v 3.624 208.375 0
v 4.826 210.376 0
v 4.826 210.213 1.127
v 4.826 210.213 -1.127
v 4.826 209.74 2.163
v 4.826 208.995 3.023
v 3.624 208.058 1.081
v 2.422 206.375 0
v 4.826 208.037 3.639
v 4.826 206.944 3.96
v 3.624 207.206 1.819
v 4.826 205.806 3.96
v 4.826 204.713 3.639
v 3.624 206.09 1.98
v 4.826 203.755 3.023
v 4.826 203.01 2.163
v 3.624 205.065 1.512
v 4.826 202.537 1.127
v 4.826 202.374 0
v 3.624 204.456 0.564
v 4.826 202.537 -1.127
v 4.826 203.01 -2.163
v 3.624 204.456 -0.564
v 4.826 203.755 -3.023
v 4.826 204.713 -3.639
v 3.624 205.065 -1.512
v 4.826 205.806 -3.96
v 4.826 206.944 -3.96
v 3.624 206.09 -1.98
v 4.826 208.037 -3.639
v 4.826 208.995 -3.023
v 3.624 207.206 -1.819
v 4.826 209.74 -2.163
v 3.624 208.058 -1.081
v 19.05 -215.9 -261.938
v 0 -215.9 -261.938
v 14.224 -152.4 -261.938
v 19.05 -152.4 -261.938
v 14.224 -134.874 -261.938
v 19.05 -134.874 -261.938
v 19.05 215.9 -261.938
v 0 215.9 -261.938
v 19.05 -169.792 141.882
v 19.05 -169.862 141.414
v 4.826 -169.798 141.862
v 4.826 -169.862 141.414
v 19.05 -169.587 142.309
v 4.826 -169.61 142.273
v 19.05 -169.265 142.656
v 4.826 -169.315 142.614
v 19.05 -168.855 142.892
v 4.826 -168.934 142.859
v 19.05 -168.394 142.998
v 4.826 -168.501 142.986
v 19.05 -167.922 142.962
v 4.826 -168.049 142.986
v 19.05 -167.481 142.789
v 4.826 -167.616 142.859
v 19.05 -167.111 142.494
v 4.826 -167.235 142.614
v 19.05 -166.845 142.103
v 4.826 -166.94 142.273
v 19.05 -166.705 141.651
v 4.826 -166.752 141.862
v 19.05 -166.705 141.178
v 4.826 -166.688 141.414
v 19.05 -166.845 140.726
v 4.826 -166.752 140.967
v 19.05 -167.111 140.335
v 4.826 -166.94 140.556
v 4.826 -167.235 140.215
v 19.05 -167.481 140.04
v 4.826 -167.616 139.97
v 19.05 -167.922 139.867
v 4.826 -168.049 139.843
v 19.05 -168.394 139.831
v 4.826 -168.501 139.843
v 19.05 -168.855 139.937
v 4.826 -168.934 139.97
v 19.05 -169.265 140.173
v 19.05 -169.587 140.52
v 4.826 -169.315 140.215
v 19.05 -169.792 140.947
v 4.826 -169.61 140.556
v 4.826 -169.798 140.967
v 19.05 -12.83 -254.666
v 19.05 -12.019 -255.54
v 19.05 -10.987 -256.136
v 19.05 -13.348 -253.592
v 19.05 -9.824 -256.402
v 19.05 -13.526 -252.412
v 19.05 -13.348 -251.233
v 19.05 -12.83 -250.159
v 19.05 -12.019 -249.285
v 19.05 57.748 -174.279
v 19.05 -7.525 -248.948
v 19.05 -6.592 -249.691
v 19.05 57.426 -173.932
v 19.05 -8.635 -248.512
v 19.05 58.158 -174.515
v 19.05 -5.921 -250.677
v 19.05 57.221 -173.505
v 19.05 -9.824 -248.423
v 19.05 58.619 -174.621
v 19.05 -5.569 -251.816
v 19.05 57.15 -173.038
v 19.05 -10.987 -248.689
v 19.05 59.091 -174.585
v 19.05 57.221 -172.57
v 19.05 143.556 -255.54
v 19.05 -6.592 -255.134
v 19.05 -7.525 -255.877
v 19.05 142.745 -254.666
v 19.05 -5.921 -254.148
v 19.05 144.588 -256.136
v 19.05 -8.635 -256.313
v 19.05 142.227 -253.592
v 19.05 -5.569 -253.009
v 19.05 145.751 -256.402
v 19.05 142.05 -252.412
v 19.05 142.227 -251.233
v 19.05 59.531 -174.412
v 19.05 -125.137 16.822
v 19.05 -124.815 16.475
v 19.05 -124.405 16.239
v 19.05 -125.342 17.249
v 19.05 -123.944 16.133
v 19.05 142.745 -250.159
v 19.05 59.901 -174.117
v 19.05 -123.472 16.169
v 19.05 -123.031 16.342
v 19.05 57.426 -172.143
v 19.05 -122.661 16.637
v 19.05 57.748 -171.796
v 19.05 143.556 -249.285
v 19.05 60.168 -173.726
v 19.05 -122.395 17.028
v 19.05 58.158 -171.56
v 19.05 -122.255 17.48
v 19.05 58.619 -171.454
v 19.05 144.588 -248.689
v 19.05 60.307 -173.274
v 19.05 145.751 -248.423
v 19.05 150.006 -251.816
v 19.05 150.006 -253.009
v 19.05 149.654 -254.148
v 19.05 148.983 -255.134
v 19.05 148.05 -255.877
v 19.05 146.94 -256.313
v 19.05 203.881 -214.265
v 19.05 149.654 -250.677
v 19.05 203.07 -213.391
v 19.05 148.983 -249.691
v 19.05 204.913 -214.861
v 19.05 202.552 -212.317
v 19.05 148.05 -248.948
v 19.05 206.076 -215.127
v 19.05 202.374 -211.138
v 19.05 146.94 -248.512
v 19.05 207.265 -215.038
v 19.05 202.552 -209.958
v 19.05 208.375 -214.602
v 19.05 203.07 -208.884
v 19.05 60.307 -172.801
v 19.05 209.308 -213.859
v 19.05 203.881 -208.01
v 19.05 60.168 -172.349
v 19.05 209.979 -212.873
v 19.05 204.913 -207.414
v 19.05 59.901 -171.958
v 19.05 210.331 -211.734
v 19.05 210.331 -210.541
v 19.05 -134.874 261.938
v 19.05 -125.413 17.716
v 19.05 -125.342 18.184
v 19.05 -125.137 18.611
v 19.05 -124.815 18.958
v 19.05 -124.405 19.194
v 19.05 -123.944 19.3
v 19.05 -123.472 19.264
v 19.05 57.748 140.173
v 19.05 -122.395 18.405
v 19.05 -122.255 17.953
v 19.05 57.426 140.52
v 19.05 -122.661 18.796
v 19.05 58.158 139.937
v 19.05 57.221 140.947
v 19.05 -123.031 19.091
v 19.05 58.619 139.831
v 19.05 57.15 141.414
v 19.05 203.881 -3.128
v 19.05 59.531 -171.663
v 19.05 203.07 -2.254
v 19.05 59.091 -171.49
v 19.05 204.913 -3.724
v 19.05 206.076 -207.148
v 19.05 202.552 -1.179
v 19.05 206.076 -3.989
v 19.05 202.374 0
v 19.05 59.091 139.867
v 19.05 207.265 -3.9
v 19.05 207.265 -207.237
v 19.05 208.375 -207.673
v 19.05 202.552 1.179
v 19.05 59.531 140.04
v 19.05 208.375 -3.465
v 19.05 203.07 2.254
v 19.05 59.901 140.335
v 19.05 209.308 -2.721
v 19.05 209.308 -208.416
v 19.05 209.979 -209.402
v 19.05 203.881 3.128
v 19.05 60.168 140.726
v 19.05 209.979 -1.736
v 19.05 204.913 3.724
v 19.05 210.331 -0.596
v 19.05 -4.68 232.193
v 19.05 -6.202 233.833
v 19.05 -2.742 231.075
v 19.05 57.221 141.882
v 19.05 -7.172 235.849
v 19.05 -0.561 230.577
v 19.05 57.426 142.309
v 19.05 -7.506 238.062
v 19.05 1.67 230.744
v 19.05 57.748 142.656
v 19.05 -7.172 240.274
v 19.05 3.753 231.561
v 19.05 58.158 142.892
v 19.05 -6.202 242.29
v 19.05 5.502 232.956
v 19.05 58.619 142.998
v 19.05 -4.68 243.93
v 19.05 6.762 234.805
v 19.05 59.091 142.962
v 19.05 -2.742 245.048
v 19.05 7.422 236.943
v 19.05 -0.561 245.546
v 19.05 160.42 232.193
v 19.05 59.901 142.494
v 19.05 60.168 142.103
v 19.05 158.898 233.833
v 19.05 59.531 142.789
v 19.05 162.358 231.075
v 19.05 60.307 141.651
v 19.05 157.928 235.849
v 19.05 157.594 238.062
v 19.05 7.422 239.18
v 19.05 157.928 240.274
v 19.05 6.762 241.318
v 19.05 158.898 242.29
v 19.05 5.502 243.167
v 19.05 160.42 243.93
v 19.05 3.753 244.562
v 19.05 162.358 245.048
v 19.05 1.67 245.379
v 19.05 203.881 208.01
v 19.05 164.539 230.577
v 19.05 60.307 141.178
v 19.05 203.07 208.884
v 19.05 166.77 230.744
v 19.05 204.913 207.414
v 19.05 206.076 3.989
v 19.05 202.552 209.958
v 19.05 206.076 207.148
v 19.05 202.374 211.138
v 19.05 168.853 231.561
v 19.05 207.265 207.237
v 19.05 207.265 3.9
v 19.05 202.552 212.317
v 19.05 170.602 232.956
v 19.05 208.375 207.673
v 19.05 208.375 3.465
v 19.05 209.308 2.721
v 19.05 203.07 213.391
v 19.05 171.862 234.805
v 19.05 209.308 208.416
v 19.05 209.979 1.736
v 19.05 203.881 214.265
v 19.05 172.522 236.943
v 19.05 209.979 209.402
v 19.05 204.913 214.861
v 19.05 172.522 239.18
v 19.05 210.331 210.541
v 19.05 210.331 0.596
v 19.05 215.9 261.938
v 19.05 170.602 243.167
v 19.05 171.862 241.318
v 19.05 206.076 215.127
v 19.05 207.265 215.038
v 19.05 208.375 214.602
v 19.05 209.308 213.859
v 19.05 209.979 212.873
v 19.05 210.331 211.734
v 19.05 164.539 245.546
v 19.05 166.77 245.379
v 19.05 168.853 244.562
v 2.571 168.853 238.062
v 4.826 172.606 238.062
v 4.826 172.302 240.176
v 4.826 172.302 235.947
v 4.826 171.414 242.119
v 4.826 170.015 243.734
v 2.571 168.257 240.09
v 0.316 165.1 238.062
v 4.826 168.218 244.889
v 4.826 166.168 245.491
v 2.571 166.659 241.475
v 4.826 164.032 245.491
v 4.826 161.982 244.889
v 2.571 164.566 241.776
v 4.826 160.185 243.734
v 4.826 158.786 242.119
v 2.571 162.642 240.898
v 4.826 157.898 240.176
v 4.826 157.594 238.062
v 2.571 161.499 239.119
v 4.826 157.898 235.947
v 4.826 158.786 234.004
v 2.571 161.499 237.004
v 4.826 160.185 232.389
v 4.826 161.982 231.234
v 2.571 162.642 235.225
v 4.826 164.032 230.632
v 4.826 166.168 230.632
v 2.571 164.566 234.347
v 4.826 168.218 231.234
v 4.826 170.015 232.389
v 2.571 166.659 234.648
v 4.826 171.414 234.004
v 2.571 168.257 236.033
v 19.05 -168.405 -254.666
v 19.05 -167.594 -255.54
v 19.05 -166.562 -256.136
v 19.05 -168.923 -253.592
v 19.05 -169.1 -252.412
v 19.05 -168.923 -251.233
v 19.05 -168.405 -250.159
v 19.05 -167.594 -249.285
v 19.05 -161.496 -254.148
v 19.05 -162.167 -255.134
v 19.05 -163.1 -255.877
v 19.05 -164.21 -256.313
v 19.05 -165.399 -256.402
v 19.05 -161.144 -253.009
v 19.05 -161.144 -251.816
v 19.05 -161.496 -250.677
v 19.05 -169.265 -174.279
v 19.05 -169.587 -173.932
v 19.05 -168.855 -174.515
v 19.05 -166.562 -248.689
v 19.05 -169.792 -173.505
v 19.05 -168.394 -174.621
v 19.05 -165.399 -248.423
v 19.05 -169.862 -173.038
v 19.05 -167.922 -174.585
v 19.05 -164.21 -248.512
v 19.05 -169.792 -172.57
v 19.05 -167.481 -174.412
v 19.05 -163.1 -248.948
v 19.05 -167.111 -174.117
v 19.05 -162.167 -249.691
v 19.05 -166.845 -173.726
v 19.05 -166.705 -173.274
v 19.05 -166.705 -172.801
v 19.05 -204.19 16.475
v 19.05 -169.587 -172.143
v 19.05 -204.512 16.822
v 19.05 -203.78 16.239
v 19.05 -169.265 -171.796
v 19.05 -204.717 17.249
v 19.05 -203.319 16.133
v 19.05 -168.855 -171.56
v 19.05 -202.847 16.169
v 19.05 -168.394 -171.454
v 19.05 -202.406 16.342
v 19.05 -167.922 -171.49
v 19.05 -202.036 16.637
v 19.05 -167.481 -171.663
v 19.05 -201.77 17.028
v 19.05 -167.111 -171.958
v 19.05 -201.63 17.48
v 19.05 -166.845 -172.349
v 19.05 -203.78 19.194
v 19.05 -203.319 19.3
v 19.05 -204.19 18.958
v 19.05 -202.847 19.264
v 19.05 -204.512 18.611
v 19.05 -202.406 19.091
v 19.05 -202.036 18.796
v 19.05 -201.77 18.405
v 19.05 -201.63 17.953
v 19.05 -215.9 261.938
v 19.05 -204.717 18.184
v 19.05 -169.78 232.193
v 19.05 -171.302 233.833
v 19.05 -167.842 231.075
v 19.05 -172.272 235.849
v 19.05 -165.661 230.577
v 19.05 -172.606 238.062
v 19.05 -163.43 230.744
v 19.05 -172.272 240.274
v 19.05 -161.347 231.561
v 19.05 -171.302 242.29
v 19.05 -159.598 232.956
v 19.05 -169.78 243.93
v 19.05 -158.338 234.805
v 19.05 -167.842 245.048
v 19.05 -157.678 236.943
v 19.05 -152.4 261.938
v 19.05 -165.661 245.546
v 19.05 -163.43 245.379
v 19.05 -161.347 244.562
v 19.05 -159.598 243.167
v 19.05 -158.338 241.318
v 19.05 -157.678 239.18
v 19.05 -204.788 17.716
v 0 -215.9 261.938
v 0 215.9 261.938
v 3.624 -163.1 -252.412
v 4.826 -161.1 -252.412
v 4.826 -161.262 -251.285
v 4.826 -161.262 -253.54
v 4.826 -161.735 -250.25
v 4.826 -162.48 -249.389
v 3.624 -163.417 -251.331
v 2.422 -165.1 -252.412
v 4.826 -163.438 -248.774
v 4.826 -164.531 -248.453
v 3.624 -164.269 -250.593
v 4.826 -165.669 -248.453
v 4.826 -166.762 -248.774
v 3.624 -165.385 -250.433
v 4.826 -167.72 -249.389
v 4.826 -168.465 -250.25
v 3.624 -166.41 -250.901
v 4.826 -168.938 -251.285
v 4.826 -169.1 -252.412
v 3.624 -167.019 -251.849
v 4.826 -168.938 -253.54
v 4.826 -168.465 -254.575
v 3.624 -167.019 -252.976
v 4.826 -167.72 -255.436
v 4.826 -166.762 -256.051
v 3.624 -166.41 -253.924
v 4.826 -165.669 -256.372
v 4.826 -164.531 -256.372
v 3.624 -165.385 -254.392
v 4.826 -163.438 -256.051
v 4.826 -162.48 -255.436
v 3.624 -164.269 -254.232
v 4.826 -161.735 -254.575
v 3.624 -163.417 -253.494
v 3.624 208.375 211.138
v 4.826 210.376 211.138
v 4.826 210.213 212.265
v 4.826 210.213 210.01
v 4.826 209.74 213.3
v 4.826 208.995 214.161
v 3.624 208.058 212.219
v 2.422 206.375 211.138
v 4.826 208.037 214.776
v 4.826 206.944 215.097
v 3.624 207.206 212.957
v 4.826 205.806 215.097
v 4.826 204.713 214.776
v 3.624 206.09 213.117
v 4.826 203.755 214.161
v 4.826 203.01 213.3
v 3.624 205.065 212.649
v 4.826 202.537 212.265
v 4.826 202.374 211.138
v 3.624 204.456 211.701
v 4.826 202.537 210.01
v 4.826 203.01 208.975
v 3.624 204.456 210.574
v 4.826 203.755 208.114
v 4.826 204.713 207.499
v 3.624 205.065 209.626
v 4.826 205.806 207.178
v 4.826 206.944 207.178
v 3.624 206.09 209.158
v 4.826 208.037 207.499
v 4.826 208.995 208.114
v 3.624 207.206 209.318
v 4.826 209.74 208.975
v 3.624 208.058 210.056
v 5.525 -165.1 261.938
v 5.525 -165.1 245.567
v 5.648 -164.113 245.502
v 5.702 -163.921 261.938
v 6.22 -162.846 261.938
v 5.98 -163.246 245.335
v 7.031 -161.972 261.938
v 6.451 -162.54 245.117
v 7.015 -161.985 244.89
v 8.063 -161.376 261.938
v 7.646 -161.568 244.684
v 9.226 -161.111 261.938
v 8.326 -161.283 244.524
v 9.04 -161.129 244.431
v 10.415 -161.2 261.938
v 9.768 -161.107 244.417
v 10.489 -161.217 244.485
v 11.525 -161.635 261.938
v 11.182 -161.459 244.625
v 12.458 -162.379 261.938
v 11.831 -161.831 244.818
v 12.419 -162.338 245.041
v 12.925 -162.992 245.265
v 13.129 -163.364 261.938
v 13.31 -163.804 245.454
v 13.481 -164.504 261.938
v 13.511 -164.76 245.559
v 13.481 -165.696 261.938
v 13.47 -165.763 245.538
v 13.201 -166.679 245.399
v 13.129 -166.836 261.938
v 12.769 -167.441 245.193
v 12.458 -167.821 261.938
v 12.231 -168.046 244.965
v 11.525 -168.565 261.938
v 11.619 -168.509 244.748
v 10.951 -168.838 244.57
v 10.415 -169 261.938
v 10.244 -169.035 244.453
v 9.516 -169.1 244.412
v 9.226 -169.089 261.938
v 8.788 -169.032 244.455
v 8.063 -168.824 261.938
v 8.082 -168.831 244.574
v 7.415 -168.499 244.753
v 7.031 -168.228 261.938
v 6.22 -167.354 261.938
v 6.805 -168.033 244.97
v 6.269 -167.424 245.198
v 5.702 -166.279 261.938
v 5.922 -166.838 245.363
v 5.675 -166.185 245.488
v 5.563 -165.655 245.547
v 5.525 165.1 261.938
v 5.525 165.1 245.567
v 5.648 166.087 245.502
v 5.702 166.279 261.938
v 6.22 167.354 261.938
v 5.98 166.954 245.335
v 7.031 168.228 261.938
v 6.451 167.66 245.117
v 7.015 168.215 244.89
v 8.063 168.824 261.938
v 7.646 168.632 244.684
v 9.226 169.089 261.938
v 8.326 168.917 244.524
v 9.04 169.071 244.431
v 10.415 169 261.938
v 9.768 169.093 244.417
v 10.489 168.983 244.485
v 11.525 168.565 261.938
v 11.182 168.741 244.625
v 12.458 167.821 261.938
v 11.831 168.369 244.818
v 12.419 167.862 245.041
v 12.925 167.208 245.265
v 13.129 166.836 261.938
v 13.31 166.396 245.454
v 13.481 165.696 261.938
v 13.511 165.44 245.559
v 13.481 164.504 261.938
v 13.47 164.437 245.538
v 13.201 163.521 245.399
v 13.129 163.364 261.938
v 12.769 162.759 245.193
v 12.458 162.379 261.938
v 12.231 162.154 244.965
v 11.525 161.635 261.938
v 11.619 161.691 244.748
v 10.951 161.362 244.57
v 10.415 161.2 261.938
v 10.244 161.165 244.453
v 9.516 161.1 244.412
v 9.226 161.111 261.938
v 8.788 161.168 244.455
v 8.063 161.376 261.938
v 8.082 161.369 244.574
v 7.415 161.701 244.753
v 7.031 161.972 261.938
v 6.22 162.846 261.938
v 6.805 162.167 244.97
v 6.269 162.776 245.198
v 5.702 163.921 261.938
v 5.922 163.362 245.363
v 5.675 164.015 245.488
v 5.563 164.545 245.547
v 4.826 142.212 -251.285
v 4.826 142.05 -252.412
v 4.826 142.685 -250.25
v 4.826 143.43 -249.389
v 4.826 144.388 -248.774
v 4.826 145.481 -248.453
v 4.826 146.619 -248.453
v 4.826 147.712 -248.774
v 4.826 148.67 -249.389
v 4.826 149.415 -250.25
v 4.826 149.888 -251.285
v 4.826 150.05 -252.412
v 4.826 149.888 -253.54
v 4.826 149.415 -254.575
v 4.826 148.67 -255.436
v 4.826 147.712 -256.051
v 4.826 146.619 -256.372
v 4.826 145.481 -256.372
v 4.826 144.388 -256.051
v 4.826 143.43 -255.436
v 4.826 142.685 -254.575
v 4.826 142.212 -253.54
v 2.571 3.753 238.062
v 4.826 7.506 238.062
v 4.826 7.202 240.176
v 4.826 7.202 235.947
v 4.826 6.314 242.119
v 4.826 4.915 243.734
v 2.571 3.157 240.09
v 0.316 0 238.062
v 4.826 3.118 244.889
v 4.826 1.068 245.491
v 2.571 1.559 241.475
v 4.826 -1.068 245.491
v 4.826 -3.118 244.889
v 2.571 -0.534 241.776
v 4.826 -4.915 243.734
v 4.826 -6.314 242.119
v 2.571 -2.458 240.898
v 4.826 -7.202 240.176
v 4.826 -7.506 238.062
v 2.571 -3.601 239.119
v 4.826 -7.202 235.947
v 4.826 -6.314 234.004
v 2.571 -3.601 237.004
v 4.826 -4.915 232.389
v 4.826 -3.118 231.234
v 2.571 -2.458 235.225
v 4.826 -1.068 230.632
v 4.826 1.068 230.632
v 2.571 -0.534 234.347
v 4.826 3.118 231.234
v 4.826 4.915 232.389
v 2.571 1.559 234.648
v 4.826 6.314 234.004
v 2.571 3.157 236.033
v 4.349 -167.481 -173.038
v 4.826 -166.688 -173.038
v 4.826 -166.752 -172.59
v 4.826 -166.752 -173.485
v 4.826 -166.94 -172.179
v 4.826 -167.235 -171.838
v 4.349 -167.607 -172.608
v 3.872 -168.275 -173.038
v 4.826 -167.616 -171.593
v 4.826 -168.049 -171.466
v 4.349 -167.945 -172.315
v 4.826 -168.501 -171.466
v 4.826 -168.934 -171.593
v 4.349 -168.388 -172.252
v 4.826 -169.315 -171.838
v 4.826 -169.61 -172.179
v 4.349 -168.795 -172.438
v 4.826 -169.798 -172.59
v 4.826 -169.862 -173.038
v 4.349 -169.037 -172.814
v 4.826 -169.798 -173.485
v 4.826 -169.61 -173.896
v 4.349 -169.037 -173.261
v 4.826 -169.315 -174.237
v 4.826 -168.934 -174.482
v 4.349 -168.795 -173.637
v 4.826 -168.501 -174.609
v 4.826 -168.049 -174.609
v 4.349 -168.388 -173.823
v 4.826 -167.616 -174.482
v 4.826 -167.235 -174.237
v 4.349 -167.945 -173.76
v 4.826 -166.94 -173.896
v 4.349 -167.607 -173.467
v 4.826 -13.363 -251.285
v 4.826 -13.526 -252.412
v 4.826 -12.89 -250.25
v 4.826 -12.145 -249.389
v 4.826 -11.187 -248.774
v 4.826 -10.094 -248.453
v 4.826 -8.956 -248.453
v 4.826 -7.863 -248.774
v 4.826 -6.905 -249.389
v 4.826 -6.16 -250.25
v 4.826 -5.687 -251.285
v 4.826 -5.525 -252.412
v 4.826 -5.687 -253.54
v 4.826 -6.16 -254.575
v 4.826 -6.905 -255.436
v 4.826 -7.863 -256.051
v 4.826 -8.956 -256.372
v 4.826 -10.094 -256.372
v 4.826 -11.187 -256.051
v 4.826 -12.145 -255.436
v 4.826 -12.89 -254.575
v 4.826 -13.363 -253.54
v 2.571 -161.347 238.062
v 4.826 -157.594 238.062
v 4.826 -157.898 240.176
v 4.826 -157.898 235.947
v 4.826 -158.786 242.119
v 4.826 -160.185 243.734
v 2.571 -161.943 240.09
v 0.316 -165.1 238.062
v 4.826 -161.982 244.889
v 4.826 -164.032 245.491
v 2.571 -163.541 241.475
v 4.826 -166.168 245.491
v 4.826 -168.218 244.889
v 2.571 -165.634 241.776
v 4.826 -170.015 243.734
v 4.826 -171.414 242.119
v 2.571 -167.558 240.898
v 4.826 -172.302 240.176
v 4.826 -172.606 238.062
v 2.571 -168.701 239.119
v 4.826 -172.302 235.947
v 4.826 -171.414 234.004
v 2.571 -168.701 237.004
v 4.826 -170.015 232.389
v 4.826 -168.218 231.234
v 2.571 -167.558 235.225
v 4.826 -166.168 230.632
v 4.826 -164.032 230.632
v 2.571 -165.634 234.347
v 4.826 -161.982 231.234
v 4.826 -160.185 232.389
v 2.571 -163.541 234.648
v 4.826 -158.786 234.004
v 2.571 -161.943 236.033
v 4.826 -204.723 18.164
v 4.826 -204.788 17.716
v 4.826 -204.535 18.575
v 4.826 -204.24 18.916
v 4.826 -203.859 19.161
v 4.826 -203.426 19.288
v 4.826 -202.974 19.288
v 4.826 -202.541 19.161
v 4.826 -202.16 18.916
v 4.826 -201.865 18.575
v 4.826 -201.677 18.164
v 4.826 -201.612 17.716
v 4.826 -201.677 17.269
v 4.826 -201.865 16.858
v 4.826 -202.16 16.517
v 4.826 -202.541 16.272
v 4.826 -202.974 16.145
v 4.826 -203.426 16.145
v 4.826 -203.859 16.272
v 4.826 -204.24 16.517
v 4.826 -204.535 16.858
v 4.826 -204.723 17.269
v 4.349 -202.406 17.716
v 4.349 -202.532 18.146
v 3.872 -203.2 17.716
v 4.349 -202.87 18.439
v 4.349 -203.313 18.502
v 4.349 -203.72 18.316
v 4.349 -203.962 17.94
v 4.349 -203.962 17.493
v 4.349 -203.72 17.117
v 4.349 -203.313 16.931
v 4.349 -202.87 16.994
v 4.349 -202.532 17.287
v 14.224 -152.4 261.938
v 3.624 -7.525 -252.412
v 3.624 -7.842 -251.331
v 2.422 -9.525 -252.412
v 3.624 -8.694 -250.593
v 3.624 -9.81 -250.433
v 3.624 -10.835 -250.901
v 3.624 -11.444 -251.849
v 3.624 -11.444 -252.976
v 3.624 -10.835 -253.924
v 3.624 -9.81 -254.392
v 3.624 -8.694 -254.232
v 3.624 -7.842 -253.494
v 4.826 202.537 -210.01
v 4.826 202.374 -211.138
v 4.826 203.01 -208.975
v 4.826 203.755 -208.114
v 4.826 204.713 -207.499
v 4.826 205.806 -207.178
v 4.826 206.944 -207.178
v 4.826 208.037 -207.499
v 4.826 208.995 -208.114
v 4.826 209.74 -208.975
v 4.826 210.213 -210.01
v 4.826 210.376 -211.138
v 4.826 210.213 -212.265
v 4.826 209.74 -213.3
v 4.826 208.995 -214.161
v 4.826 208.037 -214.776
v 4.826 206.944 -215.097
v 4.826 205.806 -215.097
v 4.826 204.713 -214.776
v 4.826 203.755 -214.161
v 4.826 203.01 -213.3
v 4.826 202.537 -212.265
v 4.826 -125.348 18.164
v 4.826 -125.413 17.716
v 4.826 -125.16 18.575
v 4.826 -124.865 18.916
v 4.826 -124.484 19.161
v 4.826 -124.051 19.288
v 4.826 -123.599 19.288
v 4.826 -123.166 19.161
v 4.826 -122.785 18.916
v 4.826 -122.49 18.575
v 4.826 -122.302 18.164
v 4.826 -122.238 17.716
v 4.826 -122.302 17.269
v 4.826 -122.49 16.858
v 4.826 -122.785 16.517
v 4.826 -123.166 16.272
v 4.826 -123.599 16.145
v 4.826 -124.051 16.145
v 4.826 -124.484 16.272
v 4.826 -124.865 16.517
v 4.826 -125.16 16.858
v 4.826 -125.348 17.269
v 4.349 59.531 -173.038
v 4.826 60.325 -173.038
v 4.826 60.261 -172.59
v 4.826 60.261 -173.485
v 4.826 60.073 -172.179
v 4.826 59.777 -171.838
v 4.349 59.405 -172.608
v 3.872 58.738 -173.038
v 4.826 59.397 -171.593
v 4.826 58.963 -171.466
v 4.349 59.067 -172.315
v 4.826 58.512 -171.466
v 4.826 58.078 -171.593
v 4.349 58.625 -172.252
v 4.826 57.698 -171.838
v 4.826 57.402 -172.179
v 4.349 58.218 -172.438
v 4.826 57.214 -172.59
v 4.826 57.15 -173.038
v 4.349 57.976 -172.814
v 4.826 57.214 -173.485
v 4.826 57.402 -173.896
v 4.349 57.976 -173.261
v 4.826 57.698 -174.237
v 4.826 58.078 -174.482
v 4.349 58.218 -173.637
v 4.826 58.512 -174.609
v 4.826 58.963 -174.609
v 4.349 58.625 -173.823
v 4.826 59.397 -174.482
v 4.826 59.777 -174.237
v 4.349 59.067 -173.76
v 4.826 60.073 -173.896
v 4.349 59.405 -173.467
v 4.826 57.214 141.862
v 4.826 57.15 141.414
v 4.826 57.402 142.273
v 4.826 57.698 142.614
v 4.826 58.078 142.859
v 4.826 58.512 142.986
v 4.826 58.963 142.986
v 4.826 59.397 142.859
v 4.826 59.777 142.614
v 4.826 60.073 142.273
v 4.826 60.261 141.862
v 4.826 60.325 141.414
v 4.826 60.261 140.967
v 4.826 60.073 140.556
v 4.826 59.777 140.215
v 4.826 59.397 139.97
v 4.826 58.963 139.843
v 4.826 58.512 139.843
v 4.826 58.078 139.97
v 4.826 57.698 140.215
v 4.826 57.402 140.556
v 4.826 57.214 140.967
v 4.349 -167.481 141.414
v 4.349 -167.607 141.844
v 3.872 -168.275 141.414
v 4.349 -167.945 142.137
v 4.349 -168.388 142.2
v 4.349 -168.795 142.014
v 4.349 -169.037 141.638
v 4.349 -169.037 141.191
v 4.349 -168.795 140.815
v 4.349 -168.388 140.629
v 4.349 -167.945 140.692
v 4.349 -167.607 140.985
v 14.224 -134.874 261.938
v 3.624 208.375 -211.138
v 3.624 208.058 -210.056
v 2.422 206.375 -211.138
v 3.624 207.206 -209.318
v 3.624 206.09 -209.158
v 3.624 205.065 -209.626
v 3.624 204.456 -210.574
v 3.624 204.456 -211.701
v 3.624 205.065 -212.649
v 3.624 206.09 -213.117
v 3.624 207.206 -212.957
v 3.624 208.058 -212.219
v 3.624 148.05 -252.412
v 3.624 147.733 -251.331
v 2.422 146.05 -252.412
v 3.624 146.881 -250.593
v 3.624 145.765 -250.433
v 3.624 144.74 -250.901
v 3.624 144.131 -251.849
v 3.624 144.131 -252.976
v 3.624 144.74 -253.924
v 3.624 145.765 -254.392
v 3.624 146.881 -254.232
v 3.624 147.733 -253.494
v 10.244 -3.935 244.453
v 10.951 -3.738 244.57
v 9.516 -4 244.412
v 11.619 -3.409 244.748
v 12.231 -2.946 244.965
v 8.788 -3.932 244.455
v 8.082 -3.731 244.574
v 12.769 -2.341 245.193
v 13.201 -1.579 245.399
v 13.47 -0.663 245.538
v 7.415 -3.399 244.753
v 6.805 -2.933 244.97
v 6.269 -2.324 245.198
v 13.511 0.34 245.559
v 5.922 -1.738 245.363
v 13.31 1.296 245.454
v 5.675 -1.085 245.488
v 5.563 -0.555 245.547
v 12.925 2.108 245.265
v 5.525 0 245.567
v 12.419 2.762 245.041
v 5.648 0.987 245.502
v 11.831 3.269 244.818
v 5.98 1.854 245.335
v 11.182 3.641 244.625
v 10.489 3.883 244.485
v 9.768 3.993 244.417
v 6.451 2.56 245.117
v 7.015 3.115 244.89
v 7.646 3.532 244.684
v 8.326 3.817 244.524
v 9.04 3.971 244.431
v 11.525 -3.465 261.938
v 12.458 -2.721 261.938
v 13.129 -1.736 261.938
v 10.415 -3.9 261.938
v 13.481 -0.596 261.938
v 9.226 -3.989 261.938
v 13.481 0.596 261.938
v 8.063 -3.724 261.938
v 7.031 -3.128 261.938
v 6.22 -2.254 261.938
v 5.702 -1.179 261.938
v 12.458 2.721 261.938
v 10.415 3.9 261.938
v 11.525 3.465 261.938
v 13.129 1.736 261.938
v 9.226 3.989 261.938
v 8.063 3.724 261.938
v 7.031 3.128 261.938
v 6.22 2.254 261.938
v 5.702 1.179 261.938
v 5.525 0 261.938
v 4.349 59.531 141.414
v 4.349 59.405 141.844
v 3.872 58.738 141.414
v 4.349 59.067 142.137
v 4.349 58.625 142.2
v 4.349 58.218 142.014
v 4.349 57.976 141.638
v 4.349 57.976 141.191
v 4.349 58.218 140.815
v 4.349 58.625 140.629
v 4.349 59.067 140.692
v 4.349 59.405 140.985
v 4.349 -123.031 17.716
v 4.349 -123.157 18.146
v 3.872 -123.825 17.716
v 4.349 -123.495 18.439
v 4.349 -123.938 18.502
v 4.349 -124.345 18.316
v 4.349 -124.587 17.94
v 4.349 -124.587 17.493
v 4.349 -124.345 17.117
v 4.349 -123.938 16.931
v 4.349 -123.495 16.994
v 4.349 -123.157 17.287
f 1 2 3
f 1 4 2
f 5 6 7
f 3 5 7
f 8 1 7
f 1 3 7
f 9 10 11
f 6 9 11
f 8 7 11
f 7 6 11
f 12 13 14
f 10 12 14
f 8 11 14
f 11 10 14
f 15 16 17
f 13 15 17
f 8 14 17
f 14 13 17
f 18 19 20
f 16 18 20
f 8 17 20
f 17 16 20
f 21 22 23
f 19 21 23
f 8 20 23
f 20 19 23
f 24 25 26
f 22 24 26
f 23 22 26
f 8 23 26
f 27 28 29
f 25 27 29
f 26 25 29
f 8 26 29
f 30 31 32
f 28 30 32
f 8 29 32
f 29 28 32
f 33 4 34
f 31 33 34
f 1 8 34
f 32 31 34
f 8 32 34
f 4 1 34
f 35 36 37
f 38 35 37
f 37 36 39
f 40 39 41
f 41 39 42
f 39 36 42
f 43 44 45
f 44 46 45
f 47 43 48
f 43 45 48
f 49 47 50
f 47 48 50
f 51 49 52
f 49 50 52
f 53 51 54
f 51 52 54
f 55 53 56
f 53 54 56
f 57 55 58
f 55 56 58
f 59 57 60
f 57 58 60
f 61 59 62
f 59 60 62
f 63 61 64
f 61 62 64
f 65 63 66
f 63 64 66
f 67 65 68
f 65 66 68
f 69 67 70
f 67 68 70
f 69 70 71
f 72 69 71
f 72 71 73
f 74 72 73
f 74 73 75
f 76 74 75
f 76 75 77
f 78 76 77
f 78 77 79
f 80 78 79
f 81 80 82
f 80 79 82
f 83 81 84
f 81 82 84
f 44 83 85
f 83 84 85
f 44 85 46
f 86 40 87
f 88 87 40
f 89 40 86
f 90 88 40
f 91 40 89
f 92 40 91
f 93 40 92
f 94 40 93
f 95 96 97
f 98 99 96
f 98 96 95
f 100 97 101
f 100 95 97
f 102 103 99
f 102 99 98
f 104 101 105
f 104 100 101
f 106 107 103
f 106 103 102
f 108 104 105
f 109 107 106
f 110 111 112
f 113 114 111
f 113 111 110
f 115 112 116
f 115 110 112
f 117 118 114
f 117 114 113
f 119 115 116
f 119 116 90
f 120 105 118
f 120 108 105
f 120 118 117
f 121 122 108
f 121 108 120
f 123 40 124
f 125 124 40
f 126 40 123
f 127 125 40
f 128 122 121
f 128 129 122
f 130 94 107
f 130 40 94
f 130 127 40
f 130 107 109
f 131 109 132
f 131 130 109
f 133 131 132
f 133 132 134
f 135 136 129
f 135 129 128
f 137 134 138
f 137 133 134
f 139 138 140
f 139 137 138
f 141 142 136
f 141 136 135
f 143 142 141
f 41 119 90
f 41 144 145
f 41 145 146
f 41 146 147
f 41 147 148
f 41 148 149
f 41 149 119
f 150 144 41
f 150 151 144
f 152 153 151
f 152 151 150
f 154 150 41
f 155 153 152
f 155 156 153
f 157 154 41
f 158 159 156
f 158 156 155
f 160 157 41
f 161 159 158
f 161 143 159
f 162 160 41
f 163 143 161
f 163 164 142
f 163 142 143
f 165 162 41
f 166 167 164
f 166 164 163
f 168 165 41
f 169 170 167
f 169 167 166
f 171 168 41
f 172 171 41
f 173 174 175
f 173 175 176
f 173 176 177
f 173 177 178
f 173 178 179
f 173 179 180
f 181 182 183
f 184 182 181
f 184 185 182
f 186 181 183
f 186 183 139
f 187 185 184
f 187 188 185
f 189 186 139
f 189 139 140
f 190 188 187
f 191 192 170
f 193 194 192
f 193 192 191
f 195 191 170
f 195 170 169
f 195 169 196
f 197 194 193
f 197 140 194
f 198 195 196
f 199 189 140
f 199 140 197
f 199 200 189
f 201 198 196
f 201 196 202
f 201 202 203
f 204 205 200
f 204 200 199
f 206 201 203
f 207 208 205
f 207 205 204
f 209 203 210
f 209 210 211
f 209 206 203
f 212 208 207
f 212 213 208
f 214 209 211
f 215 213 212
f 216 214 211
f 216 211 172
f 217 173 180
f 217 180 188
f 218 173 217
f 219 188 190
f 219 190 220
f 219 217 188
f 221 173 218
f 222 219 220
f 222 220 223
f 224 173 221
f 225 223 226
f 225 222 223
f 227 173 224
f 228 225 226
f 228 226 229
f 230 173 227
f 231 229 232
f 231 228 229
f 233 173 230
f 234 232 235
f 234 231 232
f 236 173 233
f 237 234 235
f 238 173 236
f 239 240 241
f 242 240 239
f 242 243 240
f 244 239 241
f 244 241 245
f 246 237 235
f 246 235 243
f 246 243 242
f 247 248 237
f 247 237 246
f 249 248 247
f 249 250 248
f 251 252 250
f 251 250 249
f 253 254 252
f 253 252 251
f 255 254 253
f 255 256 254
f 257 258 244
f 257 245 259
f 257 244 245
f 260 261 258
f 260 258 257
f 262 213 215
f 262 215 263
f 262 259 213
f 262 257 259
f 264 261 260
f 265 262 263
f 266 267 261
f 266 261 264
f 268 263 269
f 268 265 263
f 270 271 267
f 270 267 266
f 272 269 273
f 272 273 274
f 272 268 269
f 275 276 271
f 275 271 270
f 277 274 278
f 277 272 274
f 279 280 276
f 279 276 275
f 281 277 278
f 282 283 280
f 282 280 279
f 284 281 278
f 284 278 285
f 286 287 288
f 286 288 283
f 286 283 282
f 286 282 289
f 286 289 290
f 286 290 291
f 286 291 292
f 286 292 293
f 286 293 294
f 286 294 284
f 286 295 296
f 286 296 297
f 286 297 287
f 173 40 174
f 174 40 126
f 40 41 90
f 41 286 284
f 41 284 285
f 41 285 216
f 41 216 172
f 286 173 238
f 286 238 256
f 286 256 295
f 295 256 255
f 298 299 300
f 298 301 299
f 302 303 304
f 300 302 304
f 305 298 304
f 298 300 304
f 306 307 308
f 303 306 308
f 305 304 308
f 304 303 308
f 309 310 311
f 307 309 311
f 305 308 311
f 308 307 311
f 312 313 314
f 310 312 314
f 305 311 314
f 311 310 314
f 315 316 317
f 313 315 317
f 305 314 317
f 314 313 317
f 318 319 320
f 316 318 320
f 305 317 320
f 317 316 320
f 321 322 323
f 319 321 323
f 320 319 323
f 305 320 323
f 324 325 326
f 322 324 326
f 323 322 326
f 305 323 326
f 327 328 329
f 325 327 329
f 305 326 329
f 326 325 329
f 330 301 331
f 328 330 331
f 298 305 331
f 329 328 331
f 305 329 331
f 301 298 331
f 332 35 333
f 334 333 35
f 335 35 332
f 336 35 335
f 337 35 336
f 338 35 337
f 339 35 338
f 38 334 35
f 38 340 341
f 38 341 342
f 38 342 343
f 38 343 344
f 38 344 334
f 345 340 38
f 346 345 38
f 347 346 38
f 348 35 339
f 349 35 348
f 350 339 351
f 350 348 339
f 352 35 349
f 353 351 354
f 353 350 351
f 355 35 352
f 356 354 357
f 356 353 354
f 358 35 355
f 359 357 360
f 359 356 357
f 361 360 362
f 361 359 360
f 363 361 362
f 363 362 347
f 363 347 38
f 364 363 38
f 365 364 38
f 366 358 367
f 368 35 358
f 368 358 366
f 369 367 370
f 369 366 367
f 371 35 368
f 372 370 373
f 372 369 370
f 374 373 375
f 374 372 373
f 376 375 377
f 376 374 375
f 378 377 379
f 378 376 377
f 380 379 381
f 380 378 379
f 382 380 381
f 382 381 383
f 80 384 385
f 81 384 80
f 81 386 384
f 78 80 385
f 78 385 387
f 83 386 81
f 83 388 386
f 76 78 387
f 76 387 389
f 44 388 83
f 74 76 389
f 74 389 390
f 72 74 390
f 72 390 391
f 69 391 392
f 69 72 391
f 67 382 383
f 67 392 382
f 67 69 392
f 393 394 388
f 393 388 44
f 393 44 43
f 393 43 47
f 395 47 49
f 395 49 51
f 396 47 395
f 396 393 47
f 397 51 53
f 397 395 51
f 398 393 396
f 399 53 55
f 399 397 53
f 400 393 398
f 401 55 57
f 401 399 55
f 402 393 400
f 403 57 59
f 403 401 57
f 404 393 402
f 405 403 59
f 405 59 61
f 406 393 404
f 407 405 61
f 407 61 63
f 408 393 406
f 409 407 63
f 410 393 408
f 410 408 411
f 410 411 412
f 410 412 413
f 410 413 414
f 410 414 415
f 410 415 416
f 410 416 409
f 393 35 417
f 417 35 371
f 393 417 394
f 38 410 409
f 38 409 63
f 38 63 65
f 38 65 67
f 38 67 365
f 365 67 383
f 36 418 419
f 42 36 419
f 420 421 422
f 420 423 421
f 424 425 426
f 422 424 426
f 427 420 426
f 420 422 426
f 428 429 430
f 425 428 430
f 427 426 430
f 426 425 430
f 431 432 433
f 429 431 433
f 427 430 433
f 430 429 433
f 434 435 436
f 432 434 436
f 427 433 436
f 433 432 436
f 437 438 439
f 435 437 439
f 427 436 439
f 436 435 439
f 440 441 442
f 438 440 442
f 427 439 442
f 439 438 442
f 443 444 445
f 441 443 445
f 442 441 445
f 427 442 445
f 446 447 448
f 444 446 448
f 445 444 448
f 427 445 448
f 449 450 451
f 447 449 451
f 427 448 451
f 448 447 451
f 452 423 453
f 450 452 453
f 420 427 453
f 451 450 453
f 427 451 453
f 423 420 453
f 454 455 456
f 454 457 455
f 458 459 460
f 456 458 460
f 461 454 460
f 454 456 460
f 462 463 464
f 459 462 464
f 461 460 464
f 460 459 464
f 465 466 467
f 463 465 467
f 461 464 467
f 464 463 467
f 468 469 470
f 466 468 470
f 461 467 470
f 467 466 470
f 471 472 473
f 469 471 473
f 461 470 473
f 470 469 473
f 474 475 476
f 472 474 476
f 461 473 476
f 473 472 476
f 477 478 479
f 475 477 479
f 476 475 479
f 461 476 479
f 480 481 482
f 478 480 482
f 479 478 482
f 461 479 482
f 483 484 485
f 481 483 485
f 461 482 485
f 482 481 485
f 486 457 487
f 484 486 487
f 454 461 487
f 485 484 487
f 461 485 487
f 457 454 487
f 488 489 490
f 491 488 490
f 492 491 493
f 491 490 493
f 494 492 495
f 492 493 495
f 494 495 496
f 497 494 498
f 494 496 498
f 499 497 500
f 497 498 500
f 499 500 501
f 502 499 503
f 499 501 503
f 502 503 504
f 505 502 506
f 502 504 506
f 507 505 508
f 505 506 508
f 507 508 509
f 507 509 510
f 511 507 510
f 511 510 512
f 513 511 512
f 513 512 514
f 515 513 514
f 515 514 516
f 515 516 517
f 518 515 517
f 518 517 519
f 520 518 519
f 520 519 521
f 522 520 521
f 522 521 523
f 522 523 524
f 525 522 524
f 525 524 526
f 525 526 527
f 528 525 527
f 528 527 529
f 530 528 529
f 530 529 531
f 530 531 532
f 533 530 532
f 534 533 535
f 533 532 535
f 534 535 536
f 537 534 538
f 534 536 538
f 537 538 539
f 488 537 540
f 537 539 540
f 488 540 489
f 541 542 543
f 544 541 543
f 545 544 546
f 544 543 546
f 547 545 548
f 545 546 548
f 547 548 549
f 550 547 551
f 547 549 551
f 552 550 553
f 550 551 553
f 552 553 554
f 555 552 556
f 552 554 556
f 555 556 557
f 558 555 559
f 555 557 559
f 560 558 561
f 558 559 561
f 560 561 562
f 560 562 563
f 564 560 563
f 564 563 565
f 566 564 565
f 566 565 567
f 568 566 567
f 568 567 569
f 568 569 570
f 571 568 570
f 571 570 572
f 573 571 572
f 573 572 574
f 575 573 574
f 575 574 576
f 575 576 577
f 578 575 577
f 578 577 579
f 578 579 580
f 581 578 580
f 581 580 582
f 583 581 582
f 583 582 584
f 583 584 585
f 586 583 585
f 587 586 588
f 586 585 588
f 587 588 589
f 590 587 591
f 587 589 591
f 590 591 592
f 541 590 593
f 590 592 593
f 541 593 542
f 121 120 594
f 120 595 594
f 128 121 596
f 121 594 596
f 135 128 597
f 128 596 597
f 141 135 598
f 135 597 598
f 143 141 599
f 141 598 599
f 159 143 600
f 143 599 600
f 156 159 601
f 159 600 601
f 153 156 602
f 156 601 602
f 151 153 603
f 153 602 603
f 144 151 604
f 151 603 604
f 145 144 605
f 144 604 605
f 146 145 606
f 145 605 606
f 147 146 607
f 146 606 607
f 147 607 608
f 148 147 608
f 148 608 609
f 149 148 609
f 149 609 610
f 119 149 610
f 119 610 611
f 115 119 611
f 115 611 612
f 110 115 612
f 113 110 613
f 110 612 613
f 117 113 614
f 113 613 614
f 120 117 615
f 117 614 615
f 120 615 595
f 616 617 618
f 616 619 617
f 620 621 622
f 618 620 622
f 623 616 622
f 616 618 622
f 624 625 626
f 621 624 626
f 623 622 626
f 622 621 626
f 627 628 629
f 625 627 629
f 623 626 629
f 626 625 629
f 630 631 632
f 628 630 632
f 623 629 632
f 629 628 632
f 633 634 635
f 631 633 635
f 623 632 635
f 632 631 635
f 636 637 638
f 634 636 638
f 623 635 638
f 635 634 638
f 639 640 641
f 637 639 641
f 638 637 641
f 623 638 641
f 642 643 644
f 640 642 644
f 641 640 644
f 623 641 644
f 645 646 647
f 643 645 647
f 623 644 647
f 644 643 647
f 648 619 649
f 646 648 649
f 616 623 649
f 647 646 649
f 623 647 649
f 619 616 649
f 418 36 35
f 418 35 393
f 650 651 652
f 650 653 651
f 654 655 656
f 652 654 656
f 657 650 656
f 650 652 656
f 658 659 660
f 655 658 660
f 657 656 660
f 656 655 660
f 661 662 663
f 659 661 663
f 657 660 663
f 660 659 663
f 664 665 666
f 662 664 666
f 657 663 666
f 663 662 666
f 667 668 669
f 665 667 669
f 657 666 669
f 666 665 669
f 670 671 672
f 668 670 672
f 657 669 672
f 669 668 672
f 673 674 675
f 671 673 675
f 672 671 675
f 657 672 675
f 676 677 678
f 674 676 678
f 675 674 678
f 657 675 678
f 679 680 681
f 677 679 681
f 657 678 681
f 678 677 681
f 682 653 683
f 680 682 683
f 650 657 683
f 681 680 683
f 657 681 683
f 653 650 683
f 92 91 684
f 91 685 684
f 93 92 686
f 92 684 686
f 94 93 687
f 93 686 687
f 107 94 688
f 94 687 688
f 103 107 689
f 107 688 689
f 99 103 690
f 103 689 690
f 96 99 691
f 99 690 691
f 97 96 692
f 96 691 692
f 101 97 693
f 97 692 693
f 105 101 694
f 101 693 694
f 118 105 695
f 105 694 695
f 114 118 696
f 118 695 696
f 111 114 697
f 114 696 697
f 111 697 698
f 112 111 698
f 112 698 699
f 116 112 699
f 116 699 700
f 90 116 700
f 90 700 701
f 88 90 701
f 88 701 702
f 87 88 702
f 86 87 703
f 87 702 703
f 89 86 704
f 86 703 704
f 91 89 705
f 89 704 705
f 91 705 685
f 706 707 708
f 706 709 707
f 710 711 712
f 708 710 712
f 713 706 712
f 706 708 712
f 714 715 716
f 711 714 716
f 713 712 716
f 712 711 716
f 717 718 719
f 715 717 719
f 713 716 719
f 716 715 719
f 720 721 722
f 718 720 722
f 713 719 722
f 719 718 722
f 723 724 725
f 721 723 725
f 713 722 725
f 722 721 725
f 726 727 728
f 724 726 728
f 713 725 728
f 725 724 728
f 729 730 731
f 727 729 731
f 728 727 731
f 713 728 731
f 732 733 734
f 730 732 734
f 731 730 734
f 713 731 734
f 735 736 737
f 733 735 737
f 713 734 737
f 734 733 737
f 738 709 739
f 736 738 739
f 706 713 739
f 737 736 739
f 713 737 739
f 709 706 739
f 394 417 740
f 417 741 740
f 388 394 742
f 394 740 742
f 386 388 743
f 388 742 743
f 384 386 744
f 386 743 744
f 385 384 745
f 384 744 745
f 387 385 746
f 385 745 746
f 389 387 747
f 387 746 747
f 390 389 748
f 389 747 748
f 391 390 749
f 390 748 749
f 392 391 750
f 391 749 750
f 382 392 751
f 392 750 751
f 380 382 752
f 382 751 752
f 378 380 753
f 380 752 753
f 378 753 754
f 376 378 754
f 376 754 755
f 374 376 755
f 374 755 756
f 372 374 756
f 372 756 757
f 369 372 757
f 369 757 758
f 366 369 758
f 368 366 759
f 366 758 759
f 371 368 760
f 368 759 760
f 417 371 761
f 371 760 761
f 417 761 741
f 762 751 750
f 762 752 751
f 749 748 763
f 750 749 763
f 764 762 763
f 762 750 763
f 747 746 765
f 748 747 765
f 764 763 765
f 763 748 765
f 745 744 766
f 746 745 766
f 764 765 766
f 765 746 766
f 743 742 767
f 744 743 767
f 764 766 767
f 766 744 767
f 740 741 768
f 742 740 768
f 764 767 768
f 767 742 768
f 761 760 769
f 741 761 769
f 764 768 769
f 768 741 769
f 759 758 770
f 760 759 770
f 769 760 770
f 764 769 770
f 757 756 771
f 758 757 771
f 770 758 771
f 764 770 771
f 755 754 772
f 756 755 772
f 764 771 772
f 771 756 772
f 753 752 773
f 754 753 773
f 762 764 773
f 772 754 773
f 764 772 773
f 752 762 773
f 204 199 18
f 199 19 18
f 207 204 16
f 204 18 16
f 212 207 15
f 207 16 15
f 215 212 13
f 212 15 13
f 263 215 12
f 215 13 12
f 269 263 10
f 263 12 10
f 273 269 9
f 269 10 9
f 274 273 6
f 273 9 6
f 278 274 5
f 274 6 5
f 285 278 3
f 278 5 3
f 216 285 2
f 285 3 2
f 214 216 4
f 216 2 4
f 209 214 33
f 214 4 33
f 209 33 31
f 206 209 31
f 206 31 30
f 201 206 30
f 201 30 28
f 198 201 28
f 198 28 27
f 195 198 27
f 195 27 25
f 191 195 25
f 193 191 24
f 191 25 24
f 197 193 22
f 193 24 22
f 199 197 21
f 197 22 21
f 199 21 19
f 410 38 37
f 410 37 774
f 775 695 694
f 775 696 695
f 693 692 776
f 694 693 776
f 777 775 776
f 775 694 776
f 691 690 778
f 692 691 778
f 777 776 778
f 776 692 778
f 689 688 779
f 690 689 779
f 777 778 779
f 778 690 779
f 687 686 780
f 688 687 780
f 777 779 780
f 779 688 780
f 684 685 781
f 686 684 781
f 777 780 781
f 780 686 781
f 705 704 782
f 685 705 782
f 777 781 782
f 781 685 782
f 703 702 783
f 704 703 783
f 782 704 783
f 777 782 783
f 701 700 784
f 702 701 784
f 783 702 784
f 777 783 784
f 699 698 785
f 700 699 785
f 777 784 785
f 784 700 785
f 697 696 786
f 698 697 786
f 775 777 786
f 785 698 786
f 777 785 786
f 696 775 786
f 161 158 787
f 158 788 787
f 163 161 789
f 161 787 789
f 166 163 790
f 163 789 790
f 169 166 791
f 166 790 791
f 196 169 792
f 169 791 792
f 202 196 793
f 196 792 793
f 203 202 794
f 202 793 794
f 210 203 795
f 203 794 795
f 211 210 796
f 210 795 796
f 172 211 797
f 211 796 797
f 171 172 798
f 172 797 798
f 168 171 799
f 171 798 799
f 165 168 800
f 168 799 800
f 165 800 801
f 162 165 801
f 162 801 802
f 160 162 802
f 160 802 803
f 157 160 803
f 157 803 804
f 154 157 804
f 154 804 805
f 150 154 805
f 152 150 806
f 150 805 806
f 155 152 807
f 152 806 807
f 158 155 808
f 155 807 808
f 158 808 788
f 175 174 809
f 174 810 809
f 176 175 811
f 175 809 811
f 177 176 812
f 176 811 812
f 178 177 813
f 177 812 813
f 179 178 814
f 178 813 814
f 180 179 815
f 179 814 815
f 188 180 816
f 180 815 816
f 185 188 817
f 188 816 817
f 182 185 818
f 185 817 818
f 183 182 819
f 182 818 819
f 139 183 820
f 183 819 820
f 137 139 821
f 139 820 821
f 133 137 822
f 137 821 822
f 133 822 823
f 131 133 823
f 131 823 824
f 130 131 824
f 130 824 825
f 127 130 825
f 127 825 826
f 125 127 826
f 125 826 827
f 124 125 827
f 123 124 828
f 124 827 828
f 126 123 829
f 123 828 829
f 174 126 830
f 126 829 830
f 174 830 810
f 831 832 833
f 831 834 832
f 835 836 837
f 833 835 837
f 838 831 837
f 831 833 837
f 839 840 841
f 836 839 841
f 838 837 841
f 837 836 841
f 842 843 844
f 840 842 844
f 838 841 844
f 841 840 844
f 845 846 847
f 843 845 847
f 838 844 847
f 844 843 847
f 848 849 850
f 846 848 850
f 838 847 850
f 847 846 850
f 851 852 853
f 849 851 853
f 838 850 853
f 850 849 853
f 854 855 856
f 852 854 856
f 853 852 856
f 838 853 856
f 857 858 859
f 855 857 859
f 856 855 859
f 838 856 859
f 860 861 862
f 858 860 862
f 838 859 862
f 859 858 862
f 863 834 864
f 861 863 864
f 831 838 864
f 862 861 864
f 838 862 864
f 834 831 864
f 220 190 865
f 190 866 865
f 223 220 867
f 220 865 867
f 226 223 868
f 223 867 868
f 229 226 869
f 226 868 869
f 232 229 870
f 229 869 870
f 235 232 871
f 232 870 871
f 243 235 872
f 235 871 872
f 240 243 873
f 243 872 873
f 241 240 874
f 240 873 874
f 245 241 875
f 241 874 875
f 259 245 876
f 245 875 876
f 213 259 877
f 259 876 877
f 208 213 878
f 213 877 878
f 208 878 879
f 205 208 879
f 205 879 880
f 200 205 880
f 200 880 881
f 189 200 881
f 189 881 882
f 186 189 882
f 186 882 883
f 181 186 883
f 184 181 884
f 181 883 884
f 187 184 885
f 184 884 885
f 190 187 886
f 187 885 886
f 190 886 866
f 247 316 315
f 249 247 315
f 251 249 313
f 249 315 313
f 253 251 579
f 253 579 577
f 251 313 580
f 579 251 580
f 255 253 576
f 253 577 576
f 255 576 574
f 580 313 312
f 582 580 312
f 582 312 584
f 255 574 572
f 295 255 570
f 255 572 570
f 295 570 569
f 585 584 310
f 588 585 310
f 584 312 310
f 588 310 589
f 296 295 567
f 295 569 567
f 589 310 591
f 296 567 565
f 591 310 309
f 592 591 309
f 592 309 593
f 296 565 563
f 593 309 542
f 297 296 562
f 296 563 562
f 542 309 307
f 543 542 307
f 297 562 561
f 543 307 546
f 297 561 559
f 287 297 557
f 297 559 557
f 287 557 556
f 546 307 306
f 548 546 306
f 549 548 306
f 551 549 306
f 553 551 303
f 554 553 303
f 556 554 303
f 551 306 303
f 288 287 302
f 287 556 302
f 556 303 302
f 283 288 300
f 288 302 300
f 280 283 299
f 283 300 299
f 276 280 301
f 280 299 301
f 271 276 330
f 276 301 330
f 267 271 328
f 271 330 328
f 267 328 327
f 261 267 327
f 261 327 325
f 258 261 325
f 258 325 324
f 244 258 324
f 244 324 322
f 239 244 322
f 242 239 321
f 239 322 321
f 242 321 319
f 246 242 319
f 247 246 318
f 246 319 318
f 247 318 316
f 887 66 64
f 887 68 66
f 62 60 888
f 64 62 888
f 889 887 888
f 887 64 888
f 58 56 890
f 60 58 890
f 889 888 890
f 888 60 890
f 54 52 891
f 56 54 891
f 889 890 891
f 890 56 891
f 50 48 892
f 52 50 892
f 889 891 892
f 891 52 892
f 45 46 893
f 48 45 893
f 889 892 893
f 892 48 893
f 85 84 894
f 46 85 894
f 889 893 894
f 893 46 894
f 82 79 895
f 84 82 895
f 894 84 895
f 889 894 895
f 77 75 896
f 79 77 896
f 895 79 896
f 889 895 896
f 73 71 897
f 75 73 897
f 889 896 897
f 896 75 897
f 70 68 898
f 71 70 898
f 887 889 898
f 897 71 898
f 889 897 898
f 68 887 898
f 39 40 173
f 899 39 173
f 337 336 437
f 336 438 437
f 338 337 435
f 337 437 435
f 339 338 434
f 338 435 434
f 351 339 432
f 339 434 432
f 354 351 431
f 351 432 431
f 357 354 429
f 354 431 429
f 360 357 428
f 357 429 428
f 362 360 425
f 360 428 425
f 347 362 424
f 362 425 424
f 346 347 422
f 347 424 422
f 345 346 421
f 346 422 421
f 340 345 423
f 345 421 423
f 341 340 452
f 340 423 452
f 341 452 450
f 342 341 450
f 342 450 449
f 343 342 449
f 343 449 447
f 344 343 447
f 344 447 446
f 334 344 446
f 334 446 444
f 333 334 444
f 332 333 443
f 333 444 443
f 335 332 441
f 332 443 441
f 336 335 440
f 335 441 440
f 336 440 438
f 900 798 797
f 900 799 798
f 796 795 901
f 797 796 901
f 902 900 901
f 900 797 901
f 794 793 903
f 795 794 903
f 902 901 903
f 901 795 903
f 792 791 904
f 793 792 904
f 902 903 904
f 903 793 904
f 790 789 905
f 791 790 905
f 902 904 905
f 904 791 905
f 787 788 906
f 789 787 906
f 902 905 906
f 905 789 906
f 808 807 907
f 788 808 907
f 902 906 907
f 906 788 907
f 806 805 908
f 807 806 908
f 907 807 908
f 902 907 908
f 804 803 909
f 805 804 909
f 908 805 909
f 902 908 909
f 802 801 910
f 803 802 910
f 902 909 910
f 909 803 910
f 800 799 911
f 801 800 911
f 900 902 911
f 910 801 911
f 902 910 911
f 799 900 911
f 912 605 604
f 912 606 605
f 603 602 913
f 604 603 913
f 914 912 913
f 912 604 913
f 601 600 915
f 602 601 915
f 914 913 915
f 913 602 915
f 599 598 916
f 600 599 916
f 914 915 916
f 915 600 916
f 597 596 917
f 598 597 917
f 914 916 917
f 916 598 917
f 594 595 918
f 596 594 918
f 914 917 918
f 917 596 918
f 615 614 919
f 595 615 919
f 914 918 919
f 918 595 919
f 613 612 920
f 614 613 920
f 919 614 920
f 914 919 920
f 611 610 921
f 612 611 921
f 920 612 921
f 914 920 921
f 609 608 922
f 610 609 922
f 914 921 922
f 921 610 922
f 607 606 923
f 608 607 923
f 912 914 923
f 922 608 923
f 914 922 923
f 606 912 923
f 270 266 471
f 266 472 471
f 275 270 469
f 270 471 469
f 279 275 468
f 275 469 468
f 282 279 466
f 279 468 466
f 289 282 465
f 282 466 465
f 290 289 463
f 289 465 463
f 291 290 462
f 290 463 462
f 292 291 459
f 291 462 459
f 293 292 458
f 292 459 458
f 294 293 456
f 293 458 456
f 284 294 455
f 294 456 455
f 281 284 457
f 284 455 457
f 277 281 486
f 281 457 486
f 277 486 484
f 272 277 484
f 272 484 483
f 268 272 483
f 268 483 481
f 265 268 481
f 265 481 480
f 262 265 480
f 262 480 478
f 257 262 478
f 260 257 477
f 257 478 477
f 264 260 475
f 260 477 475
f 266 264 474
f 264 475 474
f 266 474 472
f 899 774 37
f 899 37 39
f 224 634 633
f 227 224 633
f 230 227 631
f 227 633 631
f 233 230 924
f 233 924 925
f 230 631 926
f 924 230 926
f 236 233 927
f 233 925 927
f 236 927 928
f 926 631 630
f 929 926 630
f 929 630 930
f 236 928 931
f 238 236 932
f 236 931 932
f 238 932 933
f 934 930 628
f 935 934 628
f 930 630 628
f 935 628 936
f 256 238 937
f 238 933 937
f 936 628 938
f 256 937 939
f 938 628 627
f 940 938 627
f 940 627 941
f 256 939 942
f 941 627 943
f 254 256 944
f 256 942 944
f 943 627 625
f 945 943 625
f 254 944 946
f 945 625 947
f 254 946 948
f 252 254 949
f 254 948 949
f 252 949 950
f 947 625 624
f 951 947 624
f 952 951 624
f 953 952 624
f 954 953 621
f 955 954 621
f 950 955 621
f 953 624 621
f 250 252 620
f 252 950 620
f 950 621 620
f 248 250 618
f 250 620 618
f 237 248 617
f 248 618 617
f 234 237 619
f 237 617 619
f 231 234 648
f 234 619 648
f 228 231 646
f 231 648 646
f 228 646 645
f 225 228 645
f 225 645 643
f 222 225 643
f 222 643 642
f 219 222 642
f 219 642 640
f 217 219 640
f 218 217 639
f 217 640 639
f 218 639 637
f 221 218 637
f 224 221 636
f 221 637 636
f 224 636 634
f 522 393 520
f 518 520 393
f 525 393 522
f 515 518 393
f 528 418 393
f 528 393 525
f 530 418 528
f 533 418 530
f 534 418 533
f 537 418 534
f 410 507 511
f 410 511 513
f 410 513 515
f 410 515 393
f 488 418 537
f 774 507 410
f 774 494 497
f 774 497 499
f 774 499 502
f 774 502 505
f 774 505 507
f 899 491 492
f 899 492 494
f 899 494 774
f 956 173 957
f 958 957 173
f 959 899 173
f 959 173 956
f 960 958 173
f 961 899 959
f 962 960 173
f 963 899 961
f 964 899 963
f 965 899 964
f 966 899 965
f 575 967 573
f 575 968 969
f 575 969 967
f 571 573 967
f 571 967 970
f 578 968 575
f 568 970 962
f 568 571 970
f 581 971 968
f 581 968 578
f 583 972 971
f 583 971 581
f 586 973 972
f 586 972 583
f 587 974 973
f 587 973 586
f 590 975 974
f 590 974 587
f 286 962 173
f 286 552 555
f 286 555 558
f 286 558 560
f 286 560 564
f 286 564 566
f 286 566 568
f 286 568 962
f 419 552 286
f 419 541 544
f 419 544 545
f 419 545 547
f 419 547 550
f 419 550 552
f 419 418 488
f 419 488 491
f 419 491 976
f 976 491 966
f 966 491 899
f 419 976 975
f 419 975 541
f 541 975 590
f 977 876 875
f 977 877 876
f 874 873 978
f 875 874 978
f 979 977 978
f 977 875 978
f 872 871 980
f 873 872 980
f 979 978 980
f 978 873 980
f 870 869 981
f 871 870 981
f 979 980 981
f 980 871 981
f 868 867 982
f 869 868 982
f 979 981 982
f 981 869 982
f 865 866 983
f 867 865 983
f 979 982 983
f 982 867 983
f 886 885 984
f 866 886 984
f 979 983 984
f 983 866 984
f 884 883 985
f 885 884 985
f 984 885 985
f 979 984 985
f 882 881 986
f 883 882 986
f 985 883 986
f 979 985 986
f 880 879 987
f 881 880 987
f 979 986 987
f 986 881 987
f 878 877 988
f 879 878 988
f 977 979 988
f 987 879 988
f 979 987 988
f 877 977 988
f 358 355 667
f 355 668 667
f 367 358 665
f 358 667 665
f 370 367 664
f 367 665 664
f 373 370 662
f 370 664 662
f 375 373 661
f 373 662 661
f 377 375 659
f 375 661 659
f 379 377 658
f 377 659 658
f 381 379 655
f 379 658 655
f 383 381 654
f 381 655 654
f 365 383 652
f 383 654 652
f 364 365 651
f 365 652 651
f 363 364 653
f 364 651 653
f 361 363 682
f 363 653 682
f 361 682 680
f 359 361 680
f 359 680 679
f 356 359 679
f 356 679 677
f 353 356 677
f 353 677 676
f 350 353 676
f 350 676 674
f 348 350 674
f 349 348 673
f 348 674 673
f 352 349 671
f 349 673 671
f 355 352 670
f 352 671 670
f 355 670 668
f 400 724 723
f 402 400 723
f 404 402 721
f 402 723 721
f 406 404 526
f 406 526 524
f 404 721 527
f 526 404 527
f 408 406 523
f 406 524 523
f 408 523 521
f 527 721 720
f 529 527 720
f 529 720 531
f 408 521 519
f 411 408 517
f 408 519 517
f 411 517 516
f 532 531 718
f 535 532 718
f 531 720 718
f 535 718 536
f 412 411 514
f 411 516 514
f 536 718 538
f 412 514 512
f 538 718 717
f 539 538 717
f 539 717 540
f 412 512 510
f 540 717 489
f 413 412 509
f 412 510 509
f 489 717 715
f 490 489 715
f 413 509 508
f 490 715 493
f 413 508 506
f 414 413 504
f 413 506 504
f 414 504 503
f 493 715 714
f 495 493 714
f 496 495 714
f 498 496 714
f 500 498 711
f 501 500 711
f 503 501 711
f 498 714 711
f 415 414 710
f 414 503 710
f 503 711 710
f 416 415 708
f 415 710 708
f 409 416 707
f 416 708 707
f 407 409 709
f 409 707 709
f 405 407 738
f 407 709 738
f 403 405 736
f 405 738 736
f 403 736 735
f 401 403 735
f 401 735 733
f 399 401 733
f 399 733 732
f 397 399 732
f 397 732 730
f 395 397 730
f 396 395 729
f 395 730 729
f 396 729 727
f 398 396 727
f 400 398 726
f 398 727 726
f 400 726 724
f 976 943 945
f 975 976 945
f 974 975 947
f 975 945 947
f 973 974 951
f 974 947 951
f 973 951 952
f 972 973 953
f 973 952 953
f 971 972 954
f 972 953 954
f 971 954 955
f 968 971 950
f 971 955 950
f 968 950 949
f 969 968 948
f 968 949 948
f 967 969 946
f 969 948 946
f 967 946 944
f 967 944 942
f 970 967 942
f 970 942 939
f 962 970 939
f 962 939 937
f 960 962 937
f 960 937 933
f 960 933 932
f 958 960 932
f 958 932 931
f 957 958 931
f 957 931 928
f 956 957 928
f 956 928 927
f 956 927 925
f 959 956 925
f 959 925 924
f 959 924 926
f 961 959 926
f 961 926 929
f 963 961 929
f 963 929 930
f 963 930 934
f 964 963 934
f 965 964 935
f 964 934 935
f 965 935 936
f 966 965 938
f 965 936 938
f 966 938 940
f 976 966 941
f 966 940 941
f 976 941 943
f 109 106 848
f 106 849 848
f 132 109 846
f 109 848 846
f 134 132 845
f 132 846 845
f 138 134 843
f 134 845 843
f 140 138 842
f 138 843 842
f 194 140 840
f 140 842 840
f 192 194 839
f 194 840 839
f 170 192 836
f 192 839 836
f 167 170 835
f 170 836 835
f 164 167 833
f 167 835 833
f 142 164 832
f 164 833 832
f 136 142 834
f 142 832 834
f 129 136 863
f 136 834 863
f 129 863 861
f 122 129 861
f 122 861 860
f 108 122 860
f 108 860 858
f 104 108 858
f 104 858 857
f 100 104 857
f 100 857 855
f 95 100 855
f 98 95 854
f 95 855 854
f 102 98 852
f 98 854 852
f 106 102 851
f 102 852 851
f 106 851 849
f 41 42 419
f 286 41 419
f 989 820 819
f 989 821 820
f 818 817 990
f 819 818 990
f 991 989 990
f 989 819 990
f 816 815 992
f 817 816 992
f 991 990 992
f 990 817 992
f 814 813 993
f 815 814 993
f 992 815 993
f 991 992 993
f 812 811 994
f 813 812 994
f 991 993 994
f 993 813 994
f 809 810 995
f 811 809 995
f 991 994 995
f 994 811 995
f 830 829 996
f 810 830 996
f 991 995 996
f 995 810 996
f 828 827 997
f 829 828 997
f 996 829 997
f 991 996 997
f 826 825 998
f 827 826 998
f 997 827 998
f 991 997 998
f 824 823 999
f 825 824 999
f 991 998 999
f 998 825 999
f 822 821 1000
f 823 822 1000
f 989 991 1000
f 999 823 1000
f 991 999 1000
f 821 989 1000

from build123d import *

# Parameters (mm, degrees)
F0_W      = 431.8
F0_H      = 523.875
F1_DEPTH  = 19.05
F3_D      = 8.001
F3_DEPTH  = 14.224
F3_TIP    = 2.4037429064
F4_D      = 15.0114
F4_DEPTH  = 14.224
F4_TIP    = 4.5098795482
F6_D      = 8.001
F6_DEPTH  = 25.4
F6_TIP    = 2.4037429064
F8_D      = 3.175
F8_DEPTH  = 14.224
F8_TIP    = 0.9538662327
F9_W      = 17.526
F9_H      = 523.875
F10_DEPTH = 4.826


with BuildPart() as f1:
    # F0 (on Right) → F1 (new body)
    with BuildSketch(Plane.YZ):
        Rectangle(F0_W, F0_H)
    extrude(amount=F1_DEPTH)

    # F3
    with Locations(Plane.YZ.offset(19.05)):
        with Locations((206.375, 211.1375), (206.375, -211.1375), (146.05, -252.4125), (-9.525, -252.4125), (-165.1, -252.4125), (206.375, 0)):
            Hole(F3_D / 2, depth=F3_DEPTH)
            with Locations((0, 0, -(F3_DEPTH + F3_TIP / 2))):  # 118° drill point
                Cone(0, F3_D / 2, F3_TIP, mode=Mode.SUBTRACT)

    # F4
    with Locations(Plane.YZ.offset(19.05)):
        with Locations((-165.1, 238.0615), (0, 238.0615), (165.1, 238.0615)):
            Hole(F4_D / 2, depth=F4_DEPTH)
            with Locations((0, 0, -(F4_DEPTH + F4_TIP / 2))):  # 118° drill point
                Cone(0, F4_D / 2, F4_TIP, mode=Mode.SUBTRACT)

    # F6
    with Locations(Plane.XY.offset(261.9375)):
        with Locations((9.525, 165.1), (9.525, 0), (9.525, -165.1)):
            Hole(F6_D / 2, depth=F6_DEPTH)
            with Locations((0, 0, -(F6_DEPTH + F6_TIP / 2))):  # 118° drill point
                Cone(0, F6_D / 2, F6_TIP, mode=Mode.SUBTRACT)

    # F8
    with Locations(Plane.YZ.offset(19.05)):
        with Locations((-168.275, 141.4145), (58.7375, 141.4145), (-203.2, 17.7165), (-123.825, 17.7165), (-168.275, -173.0375), (58.7375, -173.0375)):
            Hole(F8_D / 2, depth=F8_DEPTH)
            with Locations((0, 0, -(F8_DEPTH + F8_TIP / 2))):  # 118° drill point
                Cone(0, F8_D / 2, F8_TIP, mode=Mode.SUBTRACT)

    # F9 (on face) → F10 (cut)
    with BuildSketch(Plane.YZ.offset(19.05)):
        with Locations((-143.637, 0)):
            Rectangle(F9_W, F9_H)
    extrude(amount=-F10_DEPTH, mode=Mode.SUBTRACT)


solid = f1.part
